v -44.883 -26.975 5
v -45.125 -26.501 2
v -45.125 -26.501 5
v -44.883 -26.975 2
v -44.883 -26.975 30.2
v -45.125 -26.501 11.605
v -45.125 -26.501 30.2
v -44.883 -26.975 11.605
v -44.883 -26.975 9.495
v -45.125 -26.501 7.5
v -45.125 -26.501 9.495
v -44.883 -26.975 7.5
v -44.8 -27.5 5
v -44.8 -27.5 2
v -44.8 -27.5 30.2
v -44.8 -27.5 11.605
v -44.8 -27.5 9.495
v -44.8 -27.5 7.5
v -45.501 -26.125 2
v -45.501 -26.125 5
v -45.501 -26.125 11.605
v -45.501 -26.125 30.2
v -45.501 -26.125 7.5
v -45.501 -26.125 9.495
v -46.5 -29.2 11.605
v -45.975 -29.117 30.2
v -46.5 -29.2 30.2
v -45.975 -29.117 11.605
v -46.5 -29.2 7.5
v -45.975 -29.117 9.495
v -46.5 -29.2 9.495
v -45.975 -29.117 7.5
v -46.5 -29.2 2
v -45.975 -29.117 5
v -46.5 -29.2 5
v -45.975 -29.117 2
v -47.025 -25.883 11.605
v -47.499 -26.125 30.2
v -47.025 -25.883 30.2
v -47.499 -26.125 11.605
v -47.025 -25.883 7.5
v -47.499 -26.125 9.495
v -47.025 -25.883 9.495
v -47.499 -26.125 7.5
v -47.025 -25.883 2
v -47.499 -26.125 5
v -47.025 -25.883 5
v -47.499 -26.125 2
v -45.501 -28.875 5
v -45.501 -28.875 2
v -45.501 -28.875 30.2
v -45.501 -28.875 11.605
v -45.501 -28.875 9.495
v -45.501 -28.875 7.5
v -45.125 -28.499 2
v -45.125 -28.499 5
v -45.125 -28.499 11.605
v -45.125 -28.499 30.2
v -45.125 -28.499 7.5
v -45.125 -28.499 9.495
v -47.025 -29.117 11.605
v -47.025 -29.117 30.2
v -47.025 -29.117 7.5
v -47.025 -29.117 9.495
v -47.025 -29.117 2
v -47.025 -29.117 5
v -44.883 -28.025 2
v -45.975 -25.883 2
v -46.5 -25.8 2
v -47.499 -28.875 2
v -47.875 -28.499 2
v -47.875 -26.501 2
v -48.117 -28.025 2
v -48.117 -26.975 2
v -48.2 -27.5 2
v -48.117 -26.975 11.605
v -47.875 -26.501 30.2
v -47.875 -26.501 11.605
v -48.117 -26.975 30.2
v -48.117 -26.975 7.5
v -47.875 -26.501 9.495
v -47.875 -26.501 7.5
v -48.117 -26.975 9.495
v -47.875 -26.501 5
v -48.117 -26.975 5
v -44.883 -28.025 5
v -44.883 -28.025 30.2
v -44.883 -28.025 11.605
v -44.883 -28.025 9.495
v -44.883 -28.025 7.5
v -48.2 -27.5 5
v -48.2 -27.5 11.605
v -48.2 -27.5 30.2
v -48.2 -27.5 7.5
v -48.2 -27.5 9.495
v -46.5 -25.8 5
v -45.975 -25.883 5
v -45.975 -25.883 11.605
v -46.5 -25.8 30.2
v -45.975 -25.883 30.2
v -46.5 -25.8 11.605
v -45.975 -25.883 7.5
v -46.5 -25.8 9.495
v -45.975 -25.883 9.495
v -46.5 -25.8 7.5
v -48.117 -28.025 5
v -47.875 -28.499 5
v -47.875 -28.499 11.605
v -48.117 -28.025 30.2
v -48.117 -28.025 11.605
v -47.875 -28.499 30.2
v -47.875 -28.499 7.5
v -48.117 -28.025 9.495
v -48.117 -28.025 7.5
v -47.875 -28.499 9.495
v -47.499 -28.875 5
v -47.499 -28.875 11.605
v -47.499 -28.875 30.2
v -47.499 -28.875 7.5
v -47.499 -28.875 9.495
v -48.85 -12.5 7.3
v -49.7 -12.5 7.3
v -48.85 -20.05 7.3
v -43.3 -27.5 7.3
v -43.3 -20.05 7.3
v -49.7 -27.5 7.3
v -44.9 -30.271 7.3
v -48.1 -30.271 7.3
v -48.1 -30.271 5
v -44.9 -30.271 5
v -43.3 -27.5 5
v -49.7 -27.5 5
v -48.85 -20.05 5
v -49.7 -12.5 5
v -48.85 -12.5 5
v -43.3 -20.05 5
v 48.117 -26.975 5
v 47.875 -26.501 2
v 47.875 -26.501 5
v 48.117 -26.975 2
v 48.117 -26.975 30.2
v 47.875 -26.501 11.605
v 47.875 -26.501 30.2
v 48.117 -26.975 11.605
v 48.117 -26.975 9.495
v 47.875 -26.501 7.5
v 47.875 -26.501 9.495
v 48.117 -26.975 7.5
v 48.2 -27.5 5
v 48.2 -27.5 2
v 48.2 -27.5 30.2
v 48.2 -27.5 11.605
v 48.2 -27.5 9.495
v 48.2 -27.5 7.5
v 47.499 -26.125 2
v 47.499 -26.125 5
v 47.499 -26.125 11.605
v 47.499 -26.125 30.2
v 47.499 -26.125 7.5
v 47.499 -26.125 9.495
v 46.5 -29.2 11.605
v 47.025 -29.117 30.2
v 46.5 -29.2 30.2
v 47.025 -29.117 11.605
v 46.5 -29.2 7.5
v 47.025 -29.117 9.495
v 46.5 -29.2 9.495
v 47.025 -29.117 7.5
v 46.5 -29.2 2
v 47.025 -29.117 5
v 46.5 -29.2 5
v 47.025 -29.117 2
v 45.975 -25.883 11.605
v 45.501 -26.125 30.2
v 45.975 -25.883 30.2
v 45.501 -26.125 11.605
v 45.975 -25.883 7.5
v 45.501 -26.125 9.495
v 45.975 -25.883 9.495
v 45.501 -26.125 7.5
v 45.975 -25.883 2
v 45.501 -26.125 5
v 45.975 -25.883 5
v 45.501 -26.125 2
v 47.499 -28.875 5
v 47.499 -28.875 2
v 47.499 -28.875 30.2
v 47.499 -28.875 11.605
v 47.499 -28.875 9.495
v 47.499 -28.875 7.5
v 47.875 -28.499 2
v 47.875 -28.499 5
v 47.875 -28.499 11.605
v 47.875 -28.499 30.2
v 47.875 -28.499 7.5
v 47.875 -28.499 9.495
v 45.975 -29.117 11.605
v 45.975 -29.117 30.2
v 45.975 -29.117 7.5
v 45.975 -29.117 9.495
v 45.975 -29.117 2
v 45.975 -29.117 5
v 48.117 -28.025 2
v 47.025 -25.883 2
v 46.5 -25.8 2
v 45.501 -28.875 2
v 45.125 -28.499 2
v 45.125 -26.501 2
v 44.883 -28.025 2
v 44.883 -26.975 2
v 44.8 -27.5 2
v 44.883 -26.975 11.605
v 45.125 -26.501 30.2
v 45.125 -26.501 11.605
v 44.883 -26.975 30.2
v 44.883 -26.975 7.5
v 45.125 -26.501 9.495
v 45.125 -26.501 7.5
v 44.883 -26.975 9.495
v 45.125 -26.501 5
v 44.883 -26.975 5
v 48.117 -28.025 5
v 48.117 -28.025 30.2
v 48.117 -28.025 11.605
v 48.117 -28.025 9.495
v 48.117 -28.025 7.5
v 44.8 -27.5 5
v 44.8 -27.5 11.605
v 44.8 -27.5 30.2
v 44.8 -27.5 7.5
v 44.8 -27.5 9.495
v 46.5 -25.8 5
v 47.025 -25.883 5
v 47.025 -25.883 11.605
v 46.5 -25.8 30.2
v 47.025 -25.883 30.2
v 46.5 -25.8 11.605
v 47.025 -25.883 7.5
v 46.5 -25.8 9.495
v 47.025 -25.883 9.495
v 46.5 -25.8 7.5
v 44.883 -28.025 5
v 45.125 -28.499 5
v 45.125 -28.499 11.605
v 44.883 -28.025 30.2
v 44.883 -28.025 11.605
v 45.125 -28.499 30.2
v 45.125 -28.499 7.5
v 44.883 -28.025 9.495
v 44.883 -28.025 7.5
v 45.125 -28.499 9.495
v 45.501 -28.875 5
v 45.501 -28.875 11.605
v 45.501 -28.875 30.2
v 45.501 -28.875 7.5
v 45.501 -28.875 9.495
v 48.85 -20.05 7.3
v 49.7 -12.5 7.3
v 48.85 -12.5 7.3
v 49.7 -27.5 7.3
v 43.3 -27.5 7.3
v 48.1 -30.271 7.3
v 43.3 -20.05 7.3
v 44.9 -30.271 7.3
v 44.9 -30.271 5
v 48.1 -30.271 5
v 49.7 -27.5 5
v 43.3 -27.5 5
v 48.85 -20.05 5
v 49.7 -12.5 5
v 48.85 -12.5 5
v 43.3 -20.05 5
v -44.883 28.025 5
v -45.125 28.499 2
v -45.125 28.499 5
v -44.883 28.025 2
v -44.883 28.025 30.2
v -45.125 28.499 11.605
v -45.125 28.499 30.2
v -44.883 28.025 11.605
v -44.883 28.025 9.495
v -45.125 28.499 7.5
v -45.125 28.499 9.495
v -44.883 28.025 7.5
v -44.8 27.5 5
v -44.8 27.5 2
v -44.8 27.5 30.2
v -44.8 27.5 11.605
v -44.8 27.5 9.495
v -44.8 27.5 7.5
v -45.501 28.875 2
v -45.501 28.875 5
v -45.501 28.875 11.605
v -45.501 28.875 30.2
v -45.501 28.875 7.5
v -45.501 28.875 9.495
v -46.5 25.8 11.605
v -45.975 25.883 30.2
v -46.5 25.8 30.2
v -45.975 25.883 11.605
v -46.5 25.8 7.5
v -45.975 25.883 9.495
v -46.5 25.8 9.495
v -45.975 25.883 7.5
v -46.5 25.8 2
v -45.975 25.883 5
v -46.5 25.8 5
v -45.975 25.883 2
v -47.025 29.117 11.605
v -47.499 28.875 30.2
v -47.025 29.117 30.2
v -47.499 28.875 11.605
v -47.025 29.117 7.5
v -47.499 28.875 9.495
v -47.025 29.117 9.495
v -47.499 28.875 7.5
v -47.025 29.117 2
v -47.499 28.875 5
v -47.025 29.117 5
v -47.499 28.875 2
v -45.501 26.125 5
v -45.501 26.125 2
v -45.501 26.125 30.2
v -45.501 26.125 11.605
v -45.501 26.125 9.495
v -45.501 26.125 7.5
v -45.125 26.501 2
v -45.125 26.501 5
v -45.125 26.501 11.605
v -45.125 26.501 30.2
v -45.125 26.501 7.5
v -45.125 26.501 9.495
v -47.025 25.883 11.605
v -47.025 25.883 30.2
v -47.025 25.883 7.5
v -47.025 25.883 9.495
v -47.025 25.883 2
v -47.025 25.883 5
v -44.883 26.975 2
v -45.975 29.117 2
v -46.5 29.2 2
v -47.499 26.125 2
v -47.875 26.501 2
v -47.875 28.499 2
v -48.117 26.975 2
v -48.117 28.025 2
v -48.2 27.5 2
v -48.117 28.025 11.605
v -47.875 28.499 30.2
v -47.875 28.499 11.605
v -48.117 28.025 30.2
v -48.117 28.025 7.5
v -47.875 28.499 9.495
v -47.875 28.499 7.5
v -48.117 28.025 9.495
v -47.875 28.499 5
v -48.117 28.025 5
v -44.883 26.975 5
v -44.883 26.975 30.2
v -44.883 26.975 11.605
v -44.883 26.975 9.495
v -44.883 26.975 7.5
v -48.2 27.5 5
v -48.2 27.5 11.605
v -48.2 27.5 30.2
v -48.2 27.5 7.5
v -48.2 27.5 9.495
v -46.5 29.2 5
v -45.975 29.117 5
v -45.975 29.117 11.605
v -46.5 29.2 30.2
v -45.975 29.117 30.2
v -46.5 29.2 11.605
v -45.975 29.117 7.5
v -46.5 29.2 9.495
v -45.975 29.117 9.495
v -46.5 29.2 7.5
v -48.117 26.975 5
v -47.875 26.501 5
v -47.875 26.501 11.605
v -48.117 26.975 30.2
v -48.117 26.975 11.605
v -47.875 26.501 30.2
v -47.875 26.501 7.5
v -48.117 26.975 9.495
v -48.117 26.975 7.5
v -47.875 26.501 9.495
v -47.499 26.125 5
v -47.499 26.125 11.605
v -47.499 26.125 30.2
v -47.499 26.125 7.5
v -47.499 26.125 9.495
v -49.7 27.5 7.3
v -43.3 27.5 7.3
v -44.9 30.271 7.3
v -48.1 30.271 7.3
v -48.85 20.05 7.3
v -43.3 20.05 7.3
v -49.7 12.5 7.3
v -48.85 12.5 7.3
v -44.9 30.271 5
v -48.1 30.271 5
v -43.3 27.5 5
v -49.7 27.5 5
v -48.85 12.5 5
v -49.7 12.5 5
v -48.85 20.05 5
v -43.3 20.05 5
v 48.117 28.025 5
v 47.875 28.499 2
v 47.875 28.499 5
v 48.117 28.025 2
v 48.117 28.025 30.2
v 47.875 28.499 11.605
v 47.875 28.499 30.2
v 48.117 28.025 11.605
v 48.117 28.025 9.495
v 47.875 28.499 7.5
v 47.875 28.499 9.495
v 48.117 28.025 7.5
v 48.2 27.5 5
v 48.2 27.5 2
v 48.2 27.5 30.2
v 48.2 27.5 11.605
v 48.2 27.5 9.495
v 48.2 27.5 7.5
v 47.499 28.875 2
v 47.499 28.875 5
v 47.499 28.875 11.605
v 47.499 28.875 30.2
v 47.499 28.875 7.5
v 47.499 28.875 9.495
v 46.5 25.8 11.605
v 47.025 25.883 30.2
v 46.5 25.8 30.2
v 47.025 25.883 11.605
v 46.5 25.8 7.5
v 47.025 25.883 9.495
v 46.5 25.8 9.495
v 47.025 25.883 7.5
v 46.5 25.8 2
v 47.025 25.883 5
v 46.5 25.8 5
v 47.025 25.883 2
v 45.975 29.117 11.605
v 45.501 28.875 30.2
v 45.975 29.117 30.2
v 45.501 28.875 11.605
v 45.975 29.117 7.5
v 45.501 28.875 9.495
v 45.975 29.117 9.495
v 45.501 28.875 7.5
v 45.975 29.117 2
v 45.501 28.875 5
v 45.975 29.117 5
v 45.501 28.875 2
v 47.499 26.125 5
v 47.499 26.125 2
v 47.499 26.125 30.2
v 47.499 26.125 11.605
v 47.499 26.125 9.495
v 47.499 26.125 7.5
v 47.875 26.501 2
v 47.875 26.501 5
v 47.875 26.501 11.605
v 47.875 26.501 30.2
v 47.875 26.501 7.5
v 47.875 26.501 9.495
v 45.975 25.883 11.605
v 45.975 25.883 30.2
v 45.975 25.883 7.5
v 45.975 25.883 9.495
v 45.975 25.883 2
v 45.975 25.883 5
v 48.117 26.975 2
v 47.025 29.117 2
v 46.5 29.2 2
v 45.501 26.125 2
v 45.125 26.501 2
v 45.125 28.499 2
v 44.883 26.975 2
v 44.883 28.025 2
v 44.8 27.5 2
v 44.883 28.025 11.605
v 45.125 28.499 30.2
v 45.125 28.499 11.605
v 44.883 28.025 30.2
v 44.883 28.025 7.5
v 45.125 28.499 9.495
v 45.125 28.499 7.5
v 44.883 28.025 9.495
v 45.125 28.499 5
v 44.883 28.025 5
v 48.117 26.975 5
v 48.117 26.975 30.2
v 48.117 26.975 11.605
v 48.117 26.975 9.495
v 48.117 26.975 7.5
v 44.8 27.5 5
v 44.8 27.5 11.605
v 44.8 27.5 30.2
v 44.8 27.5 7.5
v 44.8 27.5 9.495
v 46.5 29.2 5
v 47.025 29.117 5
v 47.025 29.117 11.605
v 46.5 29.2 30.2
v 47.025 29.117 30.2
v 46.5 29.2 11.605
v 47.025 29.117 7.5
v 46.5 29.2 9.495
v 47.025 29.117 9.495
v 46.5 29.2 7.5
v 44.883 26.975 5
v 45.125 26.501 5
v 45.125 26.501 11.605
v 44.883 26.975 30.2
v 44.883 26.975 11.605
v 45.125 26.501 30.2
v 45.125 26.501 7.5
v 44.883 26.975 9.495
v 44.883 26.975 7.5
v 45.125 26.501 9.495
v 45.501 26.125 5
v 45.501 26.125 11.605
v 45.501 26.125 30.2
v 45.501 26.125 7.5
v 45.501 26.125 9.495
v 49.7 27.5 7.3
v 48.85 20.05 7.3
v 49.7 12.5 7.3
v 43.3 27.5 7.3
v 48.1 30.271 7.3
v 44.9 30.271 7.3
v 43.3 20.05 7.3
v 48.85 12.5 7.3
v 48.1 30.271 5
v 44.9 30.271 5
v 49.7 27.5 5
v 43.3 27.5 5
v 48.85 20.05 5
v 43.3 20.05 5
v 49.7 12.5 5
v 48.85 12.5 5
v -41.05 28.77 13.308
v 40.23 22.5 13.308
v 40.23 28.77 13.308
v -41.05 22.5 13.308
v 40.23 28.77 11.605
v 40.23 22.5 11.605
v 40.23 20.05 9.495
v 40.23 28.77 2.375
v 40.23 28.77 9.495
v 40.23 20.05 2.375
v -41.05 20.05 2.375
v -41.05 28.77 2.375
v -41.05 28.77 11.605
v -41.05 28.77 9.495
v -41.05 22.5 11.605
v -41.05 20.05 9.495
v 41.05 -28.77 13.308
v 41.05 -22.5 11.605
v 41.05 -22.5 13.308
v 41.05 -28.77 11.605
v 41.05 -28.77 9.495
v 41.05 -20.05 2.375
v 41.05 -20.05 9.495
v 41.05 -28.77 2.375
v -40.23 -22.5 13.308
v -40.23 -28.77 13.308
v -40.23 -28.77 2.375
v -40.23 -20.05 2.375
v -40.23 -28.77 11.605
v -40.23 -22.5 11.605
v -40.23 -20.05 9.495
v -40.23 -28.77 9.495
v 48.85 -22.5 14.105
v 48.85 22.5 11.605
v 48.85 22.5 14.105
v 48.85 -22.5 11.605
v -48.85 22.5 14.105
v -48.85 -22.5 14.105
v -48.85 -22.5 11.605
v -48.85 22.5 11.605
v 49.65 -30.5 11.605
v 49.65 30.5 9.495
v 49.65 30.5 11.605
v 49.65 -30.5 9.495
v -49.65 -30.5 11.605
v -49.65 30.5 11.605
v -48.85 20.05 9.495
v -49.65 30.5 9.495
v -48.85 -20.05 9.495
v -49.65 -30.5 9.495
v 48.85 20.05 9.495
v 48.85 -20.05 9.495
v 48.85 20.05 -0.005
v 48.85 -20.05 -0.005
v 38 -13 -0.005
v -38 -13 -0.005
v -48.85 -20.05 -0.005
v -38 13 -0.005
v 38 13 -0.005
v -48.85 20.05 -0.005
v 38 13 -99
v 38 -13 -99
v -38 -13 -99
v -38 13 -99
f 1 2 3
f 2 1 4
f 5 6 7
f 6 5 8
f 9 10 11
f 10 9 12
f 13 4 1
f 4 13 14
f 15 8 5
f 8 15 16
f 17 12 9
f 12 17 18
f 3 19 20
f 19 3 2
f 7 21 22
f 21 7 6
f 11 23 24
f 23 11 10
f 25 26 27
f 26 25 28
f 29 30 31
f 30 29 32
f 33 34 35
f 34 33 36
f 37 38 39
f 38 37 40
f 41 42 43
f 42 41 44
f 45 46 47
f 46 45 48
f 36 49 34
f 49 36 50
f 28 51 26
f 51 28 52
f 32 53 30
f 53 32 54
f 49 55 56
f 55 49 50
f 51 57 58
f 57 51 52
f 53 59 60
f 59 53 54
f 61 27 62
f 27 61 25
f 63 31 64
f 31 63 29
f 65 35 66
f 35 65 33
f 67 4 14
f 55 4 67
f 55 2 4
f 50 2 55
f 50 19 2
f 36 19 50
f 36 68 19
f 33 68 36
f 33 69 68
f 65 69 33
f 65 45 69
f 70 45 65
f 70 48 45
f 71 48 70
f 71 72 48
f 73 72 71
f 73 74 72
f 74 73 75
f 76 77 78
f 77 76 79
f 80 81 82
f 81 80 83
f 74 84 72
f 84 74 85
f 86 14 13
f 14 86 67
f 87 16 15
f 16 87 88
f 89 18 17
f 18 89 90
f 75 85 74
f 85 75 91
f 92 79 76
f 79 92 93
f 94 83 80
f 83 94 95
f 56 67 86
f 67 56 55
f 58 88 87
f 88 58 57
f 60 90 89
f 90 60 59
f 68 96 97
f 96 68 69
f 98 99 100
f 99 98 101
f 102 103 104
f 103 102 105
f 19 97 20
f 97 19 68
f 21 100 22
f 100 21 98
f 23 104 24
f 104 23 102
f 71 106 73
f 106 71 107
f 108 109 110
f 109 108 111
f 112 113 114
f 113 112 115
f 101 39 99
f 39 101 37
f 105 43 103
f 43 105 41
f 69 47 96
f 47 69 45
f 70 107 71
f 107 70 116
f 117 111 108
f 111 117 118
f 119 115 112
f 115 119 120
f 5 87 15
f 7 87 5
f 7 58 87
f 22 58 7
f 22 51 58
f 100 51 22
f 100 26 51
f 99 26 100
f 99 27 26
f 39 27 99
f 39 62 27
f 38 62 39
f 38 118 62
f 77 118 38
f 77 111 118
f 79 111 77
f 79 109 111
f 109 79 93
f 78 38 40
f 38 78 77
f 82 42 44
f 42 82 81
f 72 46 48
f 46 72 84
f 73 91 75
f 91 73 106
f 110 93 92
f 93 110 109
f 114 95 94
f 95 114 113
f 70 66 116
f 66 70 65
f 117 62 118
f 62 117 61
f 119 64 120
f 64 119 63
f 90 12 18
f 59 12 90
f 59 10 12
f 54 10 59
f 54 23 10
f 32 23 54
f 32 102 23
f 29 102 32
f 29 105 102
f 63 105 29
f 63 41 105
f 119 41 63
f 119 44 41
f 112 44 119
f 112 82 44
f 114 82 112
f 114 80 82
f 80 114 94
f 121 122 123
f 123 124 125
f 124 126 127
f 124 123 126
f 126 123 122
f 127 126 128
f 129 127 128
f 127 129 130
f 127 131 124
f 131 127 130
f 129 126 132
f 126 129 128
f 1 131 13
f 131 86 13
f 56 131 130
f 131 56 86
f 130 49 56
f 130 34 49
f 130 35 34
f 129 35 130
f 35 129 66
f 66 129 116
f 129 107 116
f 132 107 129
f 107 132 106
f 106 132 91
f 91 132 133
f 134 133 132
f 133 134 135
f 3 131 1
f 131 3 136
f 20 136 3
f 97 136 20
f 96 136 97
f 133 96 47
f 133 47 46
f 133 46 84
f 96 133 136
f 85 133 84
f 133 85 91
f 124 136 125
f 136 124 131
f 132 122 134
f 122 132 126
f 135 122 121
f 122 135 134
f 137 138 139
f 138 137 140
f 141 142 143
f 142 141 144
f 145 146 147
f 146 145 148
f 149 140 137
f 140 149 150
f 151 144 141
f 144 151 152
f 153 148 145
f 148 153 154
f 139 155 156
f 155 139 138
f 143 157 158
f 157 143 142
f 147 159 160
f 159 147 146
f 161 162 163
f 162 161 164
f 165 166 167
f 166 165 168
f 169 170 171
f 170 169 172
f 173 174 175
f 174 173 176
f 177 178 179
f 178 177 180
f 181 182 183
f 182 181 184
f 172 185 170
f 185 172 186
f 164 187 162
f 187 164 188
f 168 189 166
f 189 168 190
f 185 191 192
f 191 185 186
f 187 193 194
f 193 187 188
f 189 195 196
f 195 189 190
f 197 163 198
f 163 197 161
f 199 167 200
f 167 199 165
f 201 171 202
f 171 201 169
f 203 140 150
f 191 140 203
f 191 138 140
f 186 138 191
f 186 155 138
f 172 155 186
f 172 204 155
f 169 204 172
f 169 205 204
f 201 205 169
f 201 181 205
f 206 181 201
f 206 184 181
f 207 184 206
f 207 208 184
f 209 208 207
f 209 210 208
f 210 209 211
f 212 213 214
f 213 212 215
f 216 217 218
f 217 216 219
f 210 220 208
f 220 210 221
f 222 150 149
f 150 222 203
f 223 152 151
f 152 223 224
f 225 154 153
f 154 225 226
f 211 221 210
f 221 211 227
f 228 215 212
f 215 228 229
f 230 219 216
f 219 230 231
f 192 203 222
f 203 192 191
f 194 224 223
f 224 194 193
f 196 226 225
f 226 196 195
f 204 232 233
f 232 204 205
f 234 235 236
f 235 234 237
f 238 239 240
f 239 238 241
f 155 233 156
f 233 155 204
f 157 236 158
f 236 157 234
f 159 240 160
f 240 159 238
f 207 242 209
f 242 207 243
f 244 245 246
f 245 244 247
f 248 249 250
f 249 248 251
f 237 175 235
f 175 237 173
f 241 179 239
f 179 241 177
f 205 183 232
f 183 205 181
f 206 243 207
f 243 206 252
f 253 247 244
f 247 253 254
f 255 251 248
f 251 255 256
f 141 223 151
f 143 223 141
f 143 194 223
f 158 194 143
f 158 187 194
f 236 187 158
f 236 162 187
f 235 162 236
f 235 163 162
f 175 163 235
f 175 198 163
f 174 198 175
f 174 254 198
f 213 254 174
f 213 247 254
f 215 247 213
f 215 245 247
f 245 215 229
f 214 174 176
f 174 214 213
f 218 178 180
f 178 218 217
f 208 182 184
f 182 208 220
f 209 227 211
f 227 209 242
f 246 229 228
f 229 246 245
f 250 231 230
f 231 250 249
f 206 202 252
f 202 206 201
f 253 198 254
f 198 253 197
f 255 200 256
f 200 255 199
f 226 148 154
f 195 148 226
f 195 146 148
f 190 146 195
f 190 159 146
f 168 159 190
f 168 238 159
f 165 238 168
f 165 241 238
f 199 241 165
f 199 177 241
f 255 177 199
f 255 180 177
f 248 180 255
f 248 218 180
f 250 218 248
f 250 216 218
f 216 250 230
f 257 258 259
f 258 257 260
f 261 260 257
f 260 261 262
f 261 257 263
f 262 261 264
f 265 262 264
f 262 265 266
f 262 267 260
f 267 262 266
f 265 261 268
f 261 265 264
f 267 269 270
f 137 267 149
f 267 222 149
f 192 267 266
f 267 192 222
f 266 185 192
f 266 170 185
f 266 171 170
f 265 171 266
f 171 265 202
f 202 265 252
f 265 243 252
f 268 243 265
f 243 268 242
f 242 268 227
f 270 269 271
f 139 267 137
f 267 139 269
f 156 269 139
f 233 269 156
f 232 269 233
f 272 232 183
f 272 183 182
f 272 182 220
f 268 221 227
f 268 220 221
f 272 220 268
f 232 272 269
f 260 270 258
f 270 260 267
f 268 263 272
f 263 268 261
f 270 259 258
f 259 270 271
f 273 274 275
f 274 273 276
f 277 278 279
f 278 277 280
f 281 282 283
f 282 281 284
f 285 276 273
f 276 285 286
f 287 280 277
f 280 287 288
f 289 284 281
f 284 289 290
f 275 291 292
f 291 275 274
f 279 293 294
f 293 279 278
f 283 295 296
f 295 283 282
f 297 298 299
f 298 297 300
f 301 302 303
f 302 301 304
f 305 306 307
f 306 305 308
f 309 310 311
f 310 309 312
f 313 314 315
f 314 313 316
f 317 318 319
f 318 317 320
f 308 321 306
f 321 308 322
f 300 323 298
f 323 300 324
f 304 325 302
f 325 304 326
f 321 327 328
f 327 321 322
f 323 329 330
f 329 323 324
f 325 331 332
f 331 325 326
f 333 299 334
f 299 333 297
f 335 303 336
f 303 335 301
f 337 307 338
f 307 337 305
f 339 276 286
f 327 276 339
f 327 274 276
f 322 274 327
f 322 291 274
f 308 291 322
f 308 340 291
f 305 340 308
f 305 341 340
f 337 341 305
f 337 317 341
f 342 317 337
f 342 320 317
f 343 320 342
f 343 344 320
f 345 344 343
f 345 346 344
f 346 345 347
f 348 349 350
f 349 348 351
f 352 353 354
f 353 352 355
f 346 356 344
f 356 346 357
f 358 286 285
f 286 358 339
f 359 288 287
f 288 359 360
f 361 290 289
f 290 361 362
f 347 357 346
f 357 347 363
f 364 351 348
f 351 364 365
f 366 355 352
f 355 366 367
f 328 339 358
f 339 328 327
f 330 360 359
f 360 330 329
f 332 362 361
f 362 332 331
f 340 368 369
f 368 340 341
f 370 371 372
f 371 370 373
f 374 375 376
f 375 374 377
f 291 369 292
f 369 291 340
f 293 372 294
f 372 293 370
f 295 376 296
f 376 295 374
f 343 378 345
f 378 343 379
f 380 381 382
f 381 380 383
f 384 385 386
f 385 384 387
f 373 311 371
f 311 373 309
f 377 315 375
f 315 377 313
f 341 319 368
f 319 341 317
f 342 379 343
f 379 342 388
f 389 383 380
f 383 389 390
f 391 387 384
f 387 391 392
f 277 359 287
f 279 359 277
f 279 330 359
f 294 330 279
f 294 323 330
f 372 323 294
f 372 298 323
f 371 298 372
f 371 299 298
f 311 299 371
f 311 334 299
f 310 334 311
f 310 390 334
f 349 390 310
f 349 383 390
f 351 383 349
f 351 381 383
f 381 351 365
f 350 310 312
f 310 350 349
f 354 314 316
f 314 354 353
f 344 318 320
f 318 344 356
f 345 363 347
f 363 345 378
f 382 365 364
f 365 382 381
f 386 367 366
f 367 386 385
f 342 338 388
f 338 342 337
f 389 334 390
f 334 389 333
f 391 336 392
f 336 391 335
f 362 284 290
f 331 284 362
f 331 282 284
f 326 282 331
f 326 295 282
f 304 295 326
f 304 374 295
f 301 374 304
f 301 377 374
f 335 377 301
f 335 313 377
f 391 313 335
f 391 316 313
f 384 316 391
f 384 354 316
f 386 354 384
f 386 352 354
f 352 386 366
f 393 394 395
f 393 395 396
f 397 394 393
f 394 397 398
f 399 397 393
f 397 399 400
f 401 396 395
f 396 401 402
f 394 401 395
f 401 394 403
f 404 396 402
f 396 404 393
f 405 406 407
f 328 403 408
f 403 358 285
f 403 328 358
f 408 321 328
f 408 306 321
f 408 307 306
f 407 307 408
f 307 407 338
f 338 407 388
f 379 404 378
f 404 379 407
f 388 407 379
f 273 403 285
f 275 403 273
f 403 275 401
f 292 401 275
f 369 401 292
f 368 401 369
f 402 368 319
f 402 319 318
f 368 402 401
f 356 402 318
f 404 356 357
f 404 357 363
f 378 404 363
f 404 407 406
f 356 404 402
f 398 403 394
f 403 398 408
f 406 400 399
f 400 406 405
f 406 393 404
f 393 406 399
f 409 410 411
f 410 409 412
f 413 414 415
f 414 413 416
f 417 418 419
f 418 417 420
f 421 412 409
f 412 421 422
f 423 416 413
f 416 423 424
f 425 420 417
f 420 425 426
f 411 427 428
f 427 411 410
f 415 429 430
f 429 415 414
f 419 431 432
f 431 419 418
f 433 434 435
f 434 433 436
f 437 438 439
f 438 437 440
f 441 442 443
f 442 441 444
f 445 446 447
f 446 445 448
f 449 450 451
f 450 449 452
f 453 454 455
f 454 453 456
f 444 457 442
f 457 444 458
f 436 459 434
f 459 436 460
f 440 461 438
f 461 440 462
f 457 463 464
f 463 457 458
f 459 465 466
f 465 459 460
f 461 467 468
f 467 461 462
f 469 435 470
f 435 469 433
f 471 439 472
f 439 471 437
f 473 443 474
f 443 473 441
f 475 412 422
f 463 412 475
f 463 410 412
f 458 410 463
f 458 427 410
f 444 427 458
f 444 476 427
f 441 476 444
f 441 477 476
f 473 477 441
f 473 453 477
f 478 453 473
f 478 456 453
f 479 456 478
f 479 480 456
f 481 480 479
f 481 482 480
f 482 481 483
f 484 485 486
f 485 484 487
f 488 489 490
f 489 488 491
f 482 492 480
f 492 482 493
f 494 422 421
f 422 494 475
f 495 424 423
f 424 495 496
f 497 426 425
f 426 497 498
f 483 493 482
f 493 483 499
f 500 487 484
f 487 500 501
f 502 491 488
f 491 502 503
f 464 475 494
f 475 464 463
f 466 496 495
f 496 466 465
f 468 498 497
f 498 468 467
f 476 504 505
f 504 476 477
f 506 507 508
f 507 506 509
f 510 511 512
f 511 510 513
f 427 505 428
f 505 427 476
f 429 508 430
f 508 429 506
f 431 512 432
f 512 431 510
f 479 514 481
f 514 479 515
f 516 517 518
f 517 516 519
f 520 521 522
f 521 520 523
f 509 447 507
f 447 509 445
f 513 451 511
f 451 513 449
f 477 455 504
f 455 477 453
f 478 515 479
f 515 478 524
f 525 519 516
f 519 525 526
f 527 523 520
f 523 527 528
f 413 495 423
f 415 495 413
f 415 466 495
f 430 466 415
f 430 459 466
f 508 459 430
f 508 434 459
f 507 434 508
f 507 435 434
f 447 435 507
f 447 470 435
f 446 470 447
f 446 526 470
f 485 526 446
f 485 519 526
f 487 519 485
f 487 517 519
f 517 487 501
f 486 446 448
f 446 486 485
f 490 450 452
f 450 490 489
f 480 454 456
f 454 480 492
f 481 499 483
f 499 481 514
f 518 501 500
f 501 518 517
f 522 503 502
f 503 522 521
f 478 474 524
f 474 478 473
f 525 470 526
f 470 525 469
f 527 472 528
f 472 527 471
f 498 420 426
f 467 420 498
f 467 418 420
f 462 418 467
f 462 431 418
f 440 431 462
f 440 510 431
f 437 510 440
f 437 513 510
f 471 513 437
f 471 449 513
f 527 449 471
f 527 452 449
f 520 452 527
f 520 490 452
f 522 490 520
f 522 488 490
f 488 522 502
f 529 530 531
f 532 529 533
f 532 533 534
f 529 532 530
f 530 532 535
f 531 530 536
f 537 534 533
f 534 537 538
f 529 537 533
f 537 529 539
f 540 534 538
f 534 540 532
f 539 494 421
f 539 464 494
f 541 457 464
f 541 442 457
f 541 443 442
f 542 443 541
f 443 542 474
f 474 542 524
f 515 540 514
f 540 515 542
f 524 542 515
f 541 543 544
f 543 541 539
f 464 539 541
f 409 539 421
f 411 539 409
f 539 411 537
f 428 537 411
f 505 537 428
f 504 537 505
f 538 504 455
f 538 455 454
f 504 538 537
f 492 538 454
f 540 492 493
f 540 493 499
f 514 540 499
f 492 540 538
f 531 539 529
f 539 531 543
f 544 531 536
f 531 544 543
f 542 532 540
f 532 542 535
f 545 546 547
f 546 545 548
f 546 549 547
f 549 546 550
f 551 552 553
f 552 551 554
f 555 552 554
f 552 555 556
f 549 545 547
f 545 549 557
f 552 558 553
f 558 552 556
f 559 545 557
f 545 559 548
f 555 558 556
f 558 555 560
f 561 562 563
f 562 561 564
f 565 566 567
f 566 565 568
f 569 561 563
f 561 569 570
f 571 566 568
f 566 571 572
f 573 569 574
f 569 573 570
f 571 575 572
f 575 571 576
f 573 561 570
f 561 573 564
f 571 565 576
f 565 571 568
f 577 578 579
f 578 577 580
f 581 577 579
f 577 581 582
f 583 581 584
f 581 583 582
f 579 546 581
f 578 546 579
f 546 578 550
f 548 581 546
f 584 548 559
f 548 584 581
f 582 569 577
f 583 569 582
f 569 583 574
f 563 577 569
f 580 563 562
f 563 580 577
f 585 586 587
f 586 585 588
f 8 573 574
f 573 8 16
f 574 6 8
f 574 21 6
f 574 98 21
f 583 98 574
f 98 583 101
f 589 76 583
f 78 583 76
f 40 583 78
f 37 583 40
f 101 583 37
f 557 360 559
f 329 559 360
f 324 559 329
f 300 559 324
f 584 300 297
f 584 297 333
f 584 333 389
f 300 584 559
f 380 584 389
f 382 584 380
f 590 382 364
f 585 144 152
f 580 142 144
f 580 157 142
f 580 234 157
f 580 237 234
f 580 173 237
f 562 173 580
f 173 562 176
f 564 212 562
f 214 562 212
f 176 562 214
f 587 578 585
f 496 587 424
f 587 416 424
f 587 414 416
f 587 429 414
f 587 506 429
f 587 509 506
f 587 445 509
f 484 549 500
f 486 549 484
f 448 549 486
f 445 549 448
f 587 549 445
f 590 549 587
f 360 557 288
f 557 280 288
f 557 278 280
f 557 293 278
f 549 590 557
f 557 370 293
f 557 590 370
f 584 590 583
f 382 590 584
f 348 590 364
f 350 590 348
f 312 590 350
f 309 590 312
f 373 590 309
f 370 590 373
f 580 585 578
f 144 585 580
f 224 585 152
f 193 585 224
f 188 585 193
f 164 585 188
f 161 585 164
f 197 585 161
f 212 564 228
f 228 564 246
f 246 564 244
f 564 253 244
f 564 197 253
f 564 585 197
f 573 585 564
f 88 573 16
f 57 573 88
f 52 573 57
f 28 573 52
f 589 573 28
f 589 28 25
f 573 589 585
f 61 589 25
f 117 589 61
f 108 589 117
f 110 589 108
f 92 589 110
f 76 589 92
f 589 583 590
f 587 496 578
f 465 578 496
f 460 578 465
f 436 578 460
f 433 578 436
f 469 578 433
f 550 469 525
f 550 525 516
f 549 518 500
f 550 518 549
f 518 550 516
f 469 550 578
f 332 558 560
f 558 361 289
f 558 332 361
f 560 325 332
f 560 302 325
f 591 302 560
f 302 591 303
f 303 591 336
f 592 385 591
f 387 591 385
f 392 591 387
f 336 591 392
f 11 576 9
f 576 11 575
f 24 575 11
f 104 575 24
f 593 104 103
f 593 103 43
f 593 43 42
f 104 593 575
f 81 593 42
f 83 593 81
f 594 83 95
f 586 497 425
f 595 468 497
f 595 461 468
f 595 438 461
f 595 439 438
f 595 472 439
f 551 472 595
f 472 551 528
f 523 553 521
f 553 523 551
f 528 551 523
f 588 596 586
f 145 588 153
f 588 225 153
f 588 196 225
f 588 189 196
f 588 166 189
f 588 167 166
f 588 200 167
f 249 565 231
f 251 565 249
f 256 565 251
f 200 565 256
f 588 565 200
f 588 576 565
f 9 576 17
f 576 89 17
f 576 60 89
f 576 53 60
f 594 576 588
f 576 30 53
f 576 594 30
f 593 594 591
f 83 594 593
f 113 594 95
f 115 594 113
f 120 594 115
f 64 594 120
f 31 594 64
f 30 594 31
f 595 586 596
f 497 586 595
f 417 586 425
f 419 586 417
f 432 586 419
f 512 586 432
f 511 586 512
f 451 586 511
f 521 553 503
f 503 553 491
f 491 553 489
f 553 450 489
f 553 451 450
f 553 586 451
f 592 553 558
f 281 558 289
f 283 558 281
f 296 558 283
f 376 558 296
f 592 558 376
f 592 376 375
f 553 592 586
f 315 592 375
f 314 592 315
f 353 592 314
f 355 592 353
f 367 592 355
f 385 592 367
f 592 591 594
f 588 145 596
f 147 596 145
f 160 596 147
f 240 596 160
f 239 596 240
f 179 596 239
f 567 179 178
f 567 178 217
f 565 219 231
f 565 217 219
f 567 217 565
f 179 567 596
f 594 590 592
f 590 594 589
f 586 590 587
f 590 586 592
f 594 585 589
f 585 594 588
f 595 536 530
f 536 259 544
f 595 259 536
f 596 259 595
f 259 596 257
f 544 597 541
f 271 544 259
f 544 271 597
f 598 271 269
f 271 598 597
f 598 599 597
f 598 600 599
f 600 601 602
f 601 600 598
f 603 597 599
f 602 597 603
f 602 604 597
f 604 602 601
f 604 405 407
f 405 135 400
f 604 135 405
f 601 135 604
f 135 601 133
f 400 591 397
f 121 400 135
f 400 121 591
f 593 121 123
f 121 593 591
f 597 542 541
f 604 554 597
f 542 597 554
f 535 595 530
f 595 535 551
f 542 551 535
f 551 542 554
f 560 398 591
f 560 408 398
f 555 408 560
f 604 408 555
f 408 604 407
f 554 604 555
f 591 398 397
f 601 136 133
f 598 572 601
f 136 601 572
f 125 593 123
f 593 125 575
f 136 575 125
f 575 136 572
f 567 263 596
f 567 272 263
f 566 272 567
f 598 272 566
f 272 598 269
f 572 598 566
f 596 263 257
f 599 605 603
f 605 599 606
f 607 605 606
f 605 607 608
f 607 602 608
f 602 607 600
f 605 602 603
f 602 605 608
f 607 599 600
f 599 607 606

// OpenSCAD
//lcdPanel();

lcdHull();


lcdPcbX			= 98.3	+1;
lcdPcbY			= 60.0	+1;
lcdPcbZ			=  1.6	+0.5;

lcdFrameX		= 97.2	+0.5;
lcdFrameY		= 39.6	+0.5;
lcdFrameZ		=  9.5;

lcdHoleX		= 93.0;
lcdHoleY		= 55.0;
lcdHoleDia		=  3.4;

lcdWindowX		= 76.0;
lcdWindowY		= 26.0;

lcdRearY		= 45.0;
lcdRearZ		=  2.5;

lcdPinOffset	=  5;
lcdPinDia		=  1;
lcdPins			= 16;

lcdNutDia		= 6.4;//	+0.5;
lcdNutH			= 2.3;//	+0.5;

holesupport	= 0.2;


function lcdX() = lcdPcbX;
function lcdY() = lcdPcbY;
function lcdZ() = lcdFrameZ+lcdPcbZ+lcdRearZ;
function lcdRearZ() = lcdRearZ;
function lcdFramePcb() = lcdFrameZ+lcdPcbZ;
function lcdFrame() = lcdFrameZ;
function lcdPcb() = lcdPcbZ;

module lcdReserved()
{
	translate([0, 0, lcdFrameZ+lcdPcbZ+lcdRearZ/2])
	cube([lcdFrameX, lcdRearY, lcdRearZ+0.01], center=true);
	
	for (i=[0, 1])
	{
		rotate([0, 0, 180]*i)
		translate([lcdHoleX/2-lcdPinOffset-1.27, lcdHoleY/2+1.27, lcdFrameZ/4])
		rotate([0, 0, 180])
		cube([2*lcdPins*2.54, 15, lcdFrameZ/1.5+lcdPcbZ+lcdRearZ]);
	}
}


module lcdPcb()
{
	translate([0, 0, lcdFrameZ+lcdPcbZ/2])
	cube([lcdPcbX, lcdPcbY, lcdPcbZ+0.01], center=true);
}


module lcdFrame()
{
	translate([0, 0, lcdFrameZ/2])
	cube([lcdFrameX, lcdFrameY, lcdFrameZ+0.01], center=true);
}


module lcdHoles()
{
	for (iy=[-1, 1])
	{
		for (ix=[-1, 1])
		{
			translate([ix*lcdHoleX/2, iy*lcdHoleY/2, 2])
			{
				difference()
				{
					cylinder(r=lcdHoleDia/2, h=(lcdRearZ+lcdPcbZ+lcdFrameZ)*2, $fn=20);
					translate([0, 0, 3+lcdNutH])
					cylinder(r=lcdHoleDia , h=holesupport, center=false);
				}
				
				translate([0, 0, 3])
				{
					cylinder(r=lcdNutDia/2, h=lcdNutH, $fn=6);
					
					rotate([0, 0, 90])
					rotate([0, 0, 90]*iy)
					translate([-lcdNutDia/2, 0, 0])
					cube([lcdNutDia/2*2, 15, lcdNutH]);
				}
			}
		}
	}
}


module lcdWindow()
{
	translate([-lcdWindowX/2, -lcdWindowY/2, 1-100])
	cube([lcdWindowX, lcdWindowY, 100]);
}


module lcdPins()
{
	for (i=[1: 1: lcdPins])
	{
		translate([lcdHoleX/2-lcdPinOffset-i*2.54, lcdHoleY/2, lcdFrameZ+lcdPcbZ/2])
		cylinder(r=lcdPinDia/2, h=lcdPcbZ*3, center=true, $fn=10);
	}
}


module lcdLowerNuts(offZ)
{
	for (iy=[-1, 1])
	{
		for (ix=[-1, 1])
		{
			translate([ix*lcdHoleX/2, iy*lcdHoleY/2, offZ-lcdNutH])
			cylinder(r=lcdNutDia/2, h=lcdNutH, $fn=20);
		}
	}
}

module lcdPanel()
{
	difference()
	{
		union()
		{
			lcdPcb();
			
			lcdFrame();
		}
		
		lcdHoles();
		
		lcdPins();
	}
}


module lcdHull()
{
	lcdPcb();	
	
	lcdFrame();
	
	lcdHoles();
	
	lcdReserved();
	
	lcdWindow();
}
